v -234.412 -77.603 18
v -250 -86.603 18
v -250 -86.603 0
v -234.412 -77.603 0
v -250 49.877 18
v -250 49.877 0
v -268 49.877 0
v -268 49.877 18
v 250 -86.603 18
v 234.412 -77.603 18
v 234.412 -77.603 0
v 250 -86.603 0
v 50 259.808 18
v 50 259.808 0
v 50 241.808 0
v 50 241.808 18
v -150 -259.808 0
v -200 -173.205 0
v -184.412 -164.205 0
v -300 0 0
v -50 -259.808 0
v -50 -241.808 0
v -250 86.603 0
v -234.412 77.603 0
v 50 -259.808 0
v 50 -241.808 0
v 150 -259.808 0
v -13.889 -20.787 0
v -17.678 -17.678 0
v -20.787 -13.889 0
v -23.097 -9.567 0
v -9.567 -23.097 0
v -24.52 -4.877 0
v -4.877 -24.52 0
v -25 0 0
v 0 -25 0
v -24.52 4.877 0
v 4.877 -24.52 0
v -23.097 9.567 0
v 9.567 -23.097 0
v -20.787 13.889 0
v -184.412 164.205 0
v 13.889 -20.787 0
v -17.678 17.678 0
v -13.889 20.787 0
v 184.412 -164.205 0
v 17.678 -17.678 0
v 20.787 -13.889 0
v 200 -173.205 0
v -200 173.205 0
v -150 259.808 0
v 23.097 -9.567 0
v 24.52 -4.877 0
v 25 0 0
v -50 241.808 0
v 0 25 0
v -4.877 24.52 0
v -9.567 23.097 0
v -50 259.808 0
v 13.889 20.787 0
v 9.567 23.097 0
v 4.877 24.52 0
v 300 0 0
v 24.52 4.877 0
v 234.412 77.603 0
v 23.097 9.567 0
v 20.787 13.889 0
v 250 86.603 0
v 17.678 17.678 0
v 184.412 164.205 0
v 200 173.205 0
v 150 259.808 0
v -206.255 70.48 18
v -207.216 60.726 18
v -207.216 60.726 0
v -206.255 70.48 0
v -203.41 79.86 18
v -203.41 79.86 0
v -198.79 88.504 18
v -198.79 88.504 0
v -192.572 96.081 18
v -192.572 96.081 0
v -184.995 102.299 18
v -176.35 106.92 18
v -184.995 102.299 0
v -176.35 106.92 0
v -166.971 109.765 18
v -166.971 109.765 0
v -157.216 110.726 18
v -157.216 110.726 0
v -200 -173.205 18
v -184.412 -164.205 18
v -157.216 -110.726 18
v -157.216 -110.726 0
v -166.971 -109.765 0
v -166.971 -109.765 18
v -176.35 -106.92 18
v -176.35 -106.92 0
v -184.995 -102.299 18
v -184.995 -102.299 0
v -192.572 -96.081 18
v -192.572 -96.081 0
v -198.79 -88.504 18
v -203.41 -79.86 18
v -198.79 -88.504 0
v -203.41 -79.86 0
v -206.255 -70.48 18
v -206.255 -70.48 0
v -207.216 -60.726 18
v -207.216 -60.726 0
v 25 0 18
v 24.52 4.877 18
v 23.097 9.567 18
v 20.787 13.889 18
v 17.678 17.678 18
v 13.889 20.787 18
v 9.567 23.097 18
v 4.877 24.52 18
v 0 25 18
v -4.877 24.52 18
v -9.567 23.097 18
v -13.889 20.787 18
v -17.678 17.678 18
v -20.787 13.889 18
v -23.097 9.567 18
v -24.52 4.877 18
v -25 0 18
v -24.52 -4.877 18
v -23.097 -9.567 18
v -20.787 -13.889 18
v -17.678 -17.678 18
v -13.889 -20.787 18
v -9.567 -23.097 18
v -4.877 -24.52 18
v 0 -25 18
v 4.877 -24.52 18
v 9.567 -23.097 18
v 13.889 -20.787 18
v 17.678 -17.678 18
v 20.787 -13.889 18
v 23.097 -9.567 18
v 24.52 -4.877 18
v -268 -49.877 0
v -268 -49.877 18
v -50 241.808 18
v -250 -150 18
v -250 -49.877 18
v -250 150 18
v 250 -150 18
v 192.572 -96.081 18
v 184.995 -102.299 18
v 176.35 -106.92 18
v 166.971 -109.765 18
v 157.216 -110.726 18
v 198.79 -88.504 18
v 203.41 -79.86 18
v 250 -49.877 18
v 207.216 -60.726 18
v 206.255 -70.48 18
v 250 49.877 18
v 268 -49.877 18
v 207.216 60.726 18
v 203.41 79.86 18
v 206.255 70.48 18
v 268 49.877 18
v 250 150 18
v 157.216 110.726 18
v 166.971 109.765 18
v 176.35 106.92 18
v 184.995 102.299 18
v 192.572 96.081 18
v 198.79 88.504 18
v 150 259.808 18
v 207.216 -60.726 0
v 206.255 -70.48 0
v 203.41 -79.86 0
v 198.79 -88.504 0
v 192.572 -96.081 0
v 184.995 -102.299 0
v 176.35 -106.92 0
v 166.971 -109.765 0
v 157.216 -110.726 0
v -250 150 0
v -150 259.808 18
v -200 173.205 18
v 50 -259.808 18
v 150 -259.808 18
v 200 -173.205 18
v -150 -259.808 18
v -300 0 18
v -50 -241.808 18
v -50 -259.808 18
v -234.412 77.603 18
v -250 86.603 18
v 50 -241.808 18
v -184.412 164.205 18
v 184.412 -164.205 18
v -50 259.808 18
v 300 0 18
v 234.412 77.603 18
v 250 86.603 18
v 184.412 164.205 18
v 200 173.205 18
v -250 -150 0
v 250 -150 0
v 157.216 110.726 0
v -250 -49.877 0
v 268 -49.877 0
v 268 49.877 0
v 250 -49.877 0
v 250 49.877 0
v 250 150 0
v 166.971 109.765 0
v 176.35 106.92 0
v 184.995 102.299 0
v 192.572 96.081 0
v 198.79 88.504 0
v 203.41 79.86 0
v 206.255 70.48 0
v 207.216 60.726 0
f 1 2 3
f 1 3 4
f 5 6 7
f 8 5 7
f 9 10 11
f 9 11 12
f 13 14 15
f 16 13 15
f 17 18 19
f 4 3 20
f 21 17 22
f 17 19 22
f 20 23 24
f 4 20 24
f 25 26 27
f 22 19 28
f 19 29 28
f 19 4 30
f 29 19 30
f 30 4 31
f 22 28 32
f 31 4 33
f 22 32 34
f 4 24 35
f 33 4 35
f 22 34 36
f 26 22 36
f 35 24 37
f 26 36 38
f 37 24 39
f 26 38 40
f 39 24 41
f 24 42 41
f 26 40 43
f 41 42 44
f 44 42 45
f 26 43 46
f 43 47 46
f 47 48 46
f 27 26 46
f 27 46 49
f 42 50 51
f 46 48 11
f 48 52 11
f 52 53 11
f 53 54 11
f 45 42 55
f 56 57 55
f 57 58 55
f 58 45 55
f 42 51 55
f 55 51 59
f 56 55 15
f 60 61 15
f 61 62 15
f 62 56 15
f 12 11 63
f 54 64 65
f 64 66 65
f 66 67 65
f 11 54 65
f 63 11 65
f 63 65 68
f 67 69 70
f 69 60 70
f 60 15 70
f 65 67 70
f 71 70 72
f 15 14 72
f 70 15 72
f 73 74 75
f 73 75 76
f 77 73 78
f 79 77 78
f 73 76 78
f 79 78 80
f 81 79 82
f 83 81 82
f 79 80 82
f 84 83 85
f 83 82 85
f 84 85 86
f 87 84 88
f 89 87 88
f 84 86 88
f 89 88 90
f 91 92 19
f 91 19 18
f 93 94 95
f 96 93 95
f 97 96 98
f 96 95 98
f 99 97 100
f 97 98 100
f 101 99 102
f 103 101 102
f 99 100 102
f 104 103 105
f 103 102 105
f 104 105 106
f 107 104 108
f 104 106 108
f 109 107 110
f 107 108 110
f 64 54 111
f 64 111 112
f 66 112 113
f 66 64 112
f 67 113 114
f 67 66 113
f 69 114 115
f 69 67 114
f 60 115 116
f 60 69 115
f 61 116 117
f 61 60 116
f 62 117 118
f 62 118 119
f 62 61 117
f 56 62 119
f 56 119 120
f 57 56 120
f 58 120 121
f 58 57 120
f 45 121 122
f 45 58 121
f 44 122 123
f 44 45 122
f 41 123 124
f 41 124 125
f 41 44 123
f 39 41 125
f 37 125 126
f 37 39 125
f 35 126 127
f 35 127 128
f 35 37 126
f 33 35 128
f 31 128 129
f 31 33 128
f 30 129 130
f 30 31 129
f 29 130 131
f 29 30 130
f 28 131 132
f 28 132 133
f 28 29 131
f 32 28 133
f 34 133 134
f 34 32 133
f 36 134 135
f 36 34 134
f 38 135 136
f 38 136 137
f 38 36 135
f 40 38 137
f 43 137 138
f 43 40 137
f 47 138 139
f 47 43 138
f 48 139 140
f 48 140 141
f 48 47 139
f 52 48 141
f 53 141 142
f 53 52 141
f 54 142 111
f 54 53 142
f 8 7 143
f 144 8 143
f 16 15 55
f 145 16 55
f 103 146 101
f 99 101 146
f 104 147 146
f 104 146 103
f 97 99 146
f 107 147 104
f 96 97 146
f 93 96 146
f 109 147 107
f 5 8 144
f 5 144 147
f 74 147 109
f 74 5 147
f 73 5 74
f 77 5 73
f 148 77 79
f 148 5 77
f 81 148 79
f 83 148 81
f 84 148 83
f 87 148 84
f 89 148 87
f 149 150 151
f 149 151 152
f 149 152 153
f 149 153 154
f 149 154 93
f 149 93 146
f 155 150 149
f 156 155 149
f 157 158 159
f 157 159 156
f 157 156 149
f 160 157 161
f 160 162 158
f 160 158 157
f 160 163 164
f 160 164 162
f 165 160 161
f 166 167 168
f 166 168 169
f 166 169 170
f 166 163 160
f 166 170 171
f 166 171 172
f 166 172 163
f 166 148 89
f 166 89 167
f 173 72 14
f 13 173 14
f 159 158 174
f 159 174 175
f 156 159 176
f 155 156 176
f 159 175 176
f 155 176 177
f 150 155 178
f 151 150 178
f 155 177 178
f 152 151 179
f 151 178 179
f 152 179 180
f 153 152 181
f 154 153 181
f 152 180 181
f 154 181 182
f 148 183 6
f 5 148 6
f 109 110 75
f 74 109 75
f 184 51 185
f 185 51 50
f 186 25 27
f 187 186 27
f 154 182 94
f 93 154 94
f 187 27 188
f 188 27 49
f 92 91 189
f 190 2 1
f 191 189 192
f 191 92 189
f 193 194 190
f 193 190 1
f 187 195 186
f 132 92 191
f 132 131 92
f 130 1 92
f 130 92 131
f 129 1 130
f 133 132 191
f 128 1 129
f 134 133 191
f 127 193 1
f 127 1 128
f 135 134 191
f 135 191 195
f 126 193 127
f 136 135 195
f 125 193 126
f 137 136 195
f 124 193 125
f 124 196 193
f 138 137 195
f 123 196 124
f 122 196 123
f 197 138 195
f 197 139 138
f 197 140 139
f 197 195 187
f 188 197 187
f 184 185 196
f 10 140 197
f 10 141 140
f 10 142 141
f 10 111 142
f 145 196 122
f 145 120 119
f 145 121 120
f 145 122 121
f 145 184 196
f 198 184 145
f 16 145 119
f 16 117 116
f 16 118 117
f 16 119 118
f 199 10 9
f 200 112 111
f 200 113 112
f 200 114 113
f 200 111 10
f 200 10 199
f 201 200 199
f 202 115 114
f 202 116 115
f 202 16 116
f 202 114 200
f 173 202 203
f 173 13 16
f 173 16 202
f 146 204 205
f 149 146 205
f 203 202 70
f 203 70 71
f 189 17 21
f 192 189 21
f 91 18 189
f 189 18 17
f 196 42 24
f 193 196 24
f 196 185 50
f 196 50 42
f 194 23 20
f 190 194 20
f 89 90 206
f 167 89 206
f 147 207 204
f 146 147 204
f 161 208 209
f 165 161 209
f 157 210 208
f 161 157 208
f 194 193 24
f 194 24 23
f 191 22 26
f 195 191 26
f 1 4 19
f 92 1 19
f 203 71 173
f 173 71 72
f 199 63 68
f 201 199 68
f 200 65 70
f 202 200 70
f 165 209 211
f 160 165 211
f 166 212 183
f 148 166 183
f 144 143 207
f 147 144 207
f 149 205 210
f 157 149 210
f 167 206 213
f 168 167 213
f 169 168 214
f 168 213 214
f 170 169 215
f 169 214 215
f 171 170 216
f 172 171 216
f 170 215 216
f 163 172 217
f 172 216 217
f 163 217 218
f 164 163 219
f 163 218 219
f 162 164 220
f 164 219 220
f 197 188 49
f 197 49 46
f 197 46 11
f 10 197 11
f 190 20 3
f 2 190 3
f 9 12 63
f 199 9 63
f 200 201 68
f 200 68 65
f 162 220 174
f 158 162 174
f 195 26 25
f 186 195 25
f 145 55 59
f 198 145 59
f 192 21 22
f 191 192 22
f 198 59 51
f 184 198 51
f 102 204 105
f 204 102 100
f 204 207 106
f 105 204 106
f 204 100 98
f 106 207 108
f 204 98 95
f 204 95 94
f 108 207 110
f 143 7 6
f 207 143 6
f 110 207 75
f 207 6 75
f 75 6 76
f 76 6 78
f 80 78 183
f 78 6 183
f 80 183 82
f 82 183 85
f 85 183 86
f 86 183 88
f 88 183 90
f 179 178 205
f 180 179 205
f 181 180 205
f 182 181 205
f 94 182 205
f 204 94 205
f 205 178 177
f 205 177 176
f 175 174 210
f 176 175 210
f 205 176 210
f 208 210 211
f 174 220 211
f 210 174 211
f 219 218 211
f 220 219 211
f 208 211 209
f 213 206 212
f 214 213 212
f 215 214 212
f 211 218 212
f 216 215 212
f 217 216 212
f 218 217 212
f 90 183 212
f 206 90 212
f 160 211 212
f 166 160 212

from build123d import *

# Parameters (mm, degrees)
F2_DEPTH = 18
F0_R     = 25
F3_DEPTH = 18


with BuildPart() as f2:
    # F1 (on Top) → F2 (new body)
    with BuildSketch(Plane.XY):
        Polygon((-250, -150), (250, -150), (250, -49.876846), (268, -49.876846), (268, 49.876846), (250, 49.876846), (250, 150), (-250, 150), (-250, 49.876846), (-268, 49.876846), (-268, -49.876846), (-250, -49.876846), align=None)
        with BuildLine():
            ThreePointArc((207.216233, -60.72588), (192.571572, -96.081219), (157.216233, -110.72588))
            Line((157.216233, -110.72588), (-157.216233, -110.72588))
            ThreePointArc((-157.216233, -110.72588), (-192.571572, -96.081219), (-207.216233, -60.72588))
            Line((-207.216233, -60.72588), (-207.216233, 60.72588))
            ThreePointArc((-207.216233, 60.72588), (-192.571572, 96.081219), (-157.216233, 110.72588))
            Line((-157.216233, 110.72588), (157.216233, 110.72588))
            ThreePointArc((157.216233, 110.72588), (192.571572, 96.081219), (207.216233, 60.72588))
            Line((207.216233, 60.72588), (207.216233, -60.72588))
        make_face(mode=Mode.SUBTRACT)
    extrude(amount=F2_DEPTH)


with BuildPart() as f3:
    # F0 (on Top) → F3 (new body)
    with BuildSketch(Plane.XY):
        Polygon((50, -259.807621), (150, -259.807621), (200, -173.205081), (184.411543, -164.205081), (234.411543, -77.60254), (250, -86.60254), (300, 0), (250, 86.60254), (234.411543, 77.60254), (184.411543, 164.205081), (200, 173.205081), (150, 259.807621), (50, 259.807621), (50, 241.807621), (-50, 241.807621), (-50, 259.807621), (-150, 259.807621), (-200, 173.205081), (-184.411543, 164.205081), (-234.411543, 77.60254), (-250, 86.60254), (-300, 0), (-250, -86.60254), (-234.411543, -77.60254), (-184.411543, -164.205081), (-200, -173.205081), (-150, -259.807621), (-50, -259.807621), (-50, -241.807621), (50, -241.807621), align=None)
        Circle(F0_R, mode=Mode.SUBTRACT)
    extrude(amount=F3_DEPTH)


solid = Compound([f2.part, f3.part])
